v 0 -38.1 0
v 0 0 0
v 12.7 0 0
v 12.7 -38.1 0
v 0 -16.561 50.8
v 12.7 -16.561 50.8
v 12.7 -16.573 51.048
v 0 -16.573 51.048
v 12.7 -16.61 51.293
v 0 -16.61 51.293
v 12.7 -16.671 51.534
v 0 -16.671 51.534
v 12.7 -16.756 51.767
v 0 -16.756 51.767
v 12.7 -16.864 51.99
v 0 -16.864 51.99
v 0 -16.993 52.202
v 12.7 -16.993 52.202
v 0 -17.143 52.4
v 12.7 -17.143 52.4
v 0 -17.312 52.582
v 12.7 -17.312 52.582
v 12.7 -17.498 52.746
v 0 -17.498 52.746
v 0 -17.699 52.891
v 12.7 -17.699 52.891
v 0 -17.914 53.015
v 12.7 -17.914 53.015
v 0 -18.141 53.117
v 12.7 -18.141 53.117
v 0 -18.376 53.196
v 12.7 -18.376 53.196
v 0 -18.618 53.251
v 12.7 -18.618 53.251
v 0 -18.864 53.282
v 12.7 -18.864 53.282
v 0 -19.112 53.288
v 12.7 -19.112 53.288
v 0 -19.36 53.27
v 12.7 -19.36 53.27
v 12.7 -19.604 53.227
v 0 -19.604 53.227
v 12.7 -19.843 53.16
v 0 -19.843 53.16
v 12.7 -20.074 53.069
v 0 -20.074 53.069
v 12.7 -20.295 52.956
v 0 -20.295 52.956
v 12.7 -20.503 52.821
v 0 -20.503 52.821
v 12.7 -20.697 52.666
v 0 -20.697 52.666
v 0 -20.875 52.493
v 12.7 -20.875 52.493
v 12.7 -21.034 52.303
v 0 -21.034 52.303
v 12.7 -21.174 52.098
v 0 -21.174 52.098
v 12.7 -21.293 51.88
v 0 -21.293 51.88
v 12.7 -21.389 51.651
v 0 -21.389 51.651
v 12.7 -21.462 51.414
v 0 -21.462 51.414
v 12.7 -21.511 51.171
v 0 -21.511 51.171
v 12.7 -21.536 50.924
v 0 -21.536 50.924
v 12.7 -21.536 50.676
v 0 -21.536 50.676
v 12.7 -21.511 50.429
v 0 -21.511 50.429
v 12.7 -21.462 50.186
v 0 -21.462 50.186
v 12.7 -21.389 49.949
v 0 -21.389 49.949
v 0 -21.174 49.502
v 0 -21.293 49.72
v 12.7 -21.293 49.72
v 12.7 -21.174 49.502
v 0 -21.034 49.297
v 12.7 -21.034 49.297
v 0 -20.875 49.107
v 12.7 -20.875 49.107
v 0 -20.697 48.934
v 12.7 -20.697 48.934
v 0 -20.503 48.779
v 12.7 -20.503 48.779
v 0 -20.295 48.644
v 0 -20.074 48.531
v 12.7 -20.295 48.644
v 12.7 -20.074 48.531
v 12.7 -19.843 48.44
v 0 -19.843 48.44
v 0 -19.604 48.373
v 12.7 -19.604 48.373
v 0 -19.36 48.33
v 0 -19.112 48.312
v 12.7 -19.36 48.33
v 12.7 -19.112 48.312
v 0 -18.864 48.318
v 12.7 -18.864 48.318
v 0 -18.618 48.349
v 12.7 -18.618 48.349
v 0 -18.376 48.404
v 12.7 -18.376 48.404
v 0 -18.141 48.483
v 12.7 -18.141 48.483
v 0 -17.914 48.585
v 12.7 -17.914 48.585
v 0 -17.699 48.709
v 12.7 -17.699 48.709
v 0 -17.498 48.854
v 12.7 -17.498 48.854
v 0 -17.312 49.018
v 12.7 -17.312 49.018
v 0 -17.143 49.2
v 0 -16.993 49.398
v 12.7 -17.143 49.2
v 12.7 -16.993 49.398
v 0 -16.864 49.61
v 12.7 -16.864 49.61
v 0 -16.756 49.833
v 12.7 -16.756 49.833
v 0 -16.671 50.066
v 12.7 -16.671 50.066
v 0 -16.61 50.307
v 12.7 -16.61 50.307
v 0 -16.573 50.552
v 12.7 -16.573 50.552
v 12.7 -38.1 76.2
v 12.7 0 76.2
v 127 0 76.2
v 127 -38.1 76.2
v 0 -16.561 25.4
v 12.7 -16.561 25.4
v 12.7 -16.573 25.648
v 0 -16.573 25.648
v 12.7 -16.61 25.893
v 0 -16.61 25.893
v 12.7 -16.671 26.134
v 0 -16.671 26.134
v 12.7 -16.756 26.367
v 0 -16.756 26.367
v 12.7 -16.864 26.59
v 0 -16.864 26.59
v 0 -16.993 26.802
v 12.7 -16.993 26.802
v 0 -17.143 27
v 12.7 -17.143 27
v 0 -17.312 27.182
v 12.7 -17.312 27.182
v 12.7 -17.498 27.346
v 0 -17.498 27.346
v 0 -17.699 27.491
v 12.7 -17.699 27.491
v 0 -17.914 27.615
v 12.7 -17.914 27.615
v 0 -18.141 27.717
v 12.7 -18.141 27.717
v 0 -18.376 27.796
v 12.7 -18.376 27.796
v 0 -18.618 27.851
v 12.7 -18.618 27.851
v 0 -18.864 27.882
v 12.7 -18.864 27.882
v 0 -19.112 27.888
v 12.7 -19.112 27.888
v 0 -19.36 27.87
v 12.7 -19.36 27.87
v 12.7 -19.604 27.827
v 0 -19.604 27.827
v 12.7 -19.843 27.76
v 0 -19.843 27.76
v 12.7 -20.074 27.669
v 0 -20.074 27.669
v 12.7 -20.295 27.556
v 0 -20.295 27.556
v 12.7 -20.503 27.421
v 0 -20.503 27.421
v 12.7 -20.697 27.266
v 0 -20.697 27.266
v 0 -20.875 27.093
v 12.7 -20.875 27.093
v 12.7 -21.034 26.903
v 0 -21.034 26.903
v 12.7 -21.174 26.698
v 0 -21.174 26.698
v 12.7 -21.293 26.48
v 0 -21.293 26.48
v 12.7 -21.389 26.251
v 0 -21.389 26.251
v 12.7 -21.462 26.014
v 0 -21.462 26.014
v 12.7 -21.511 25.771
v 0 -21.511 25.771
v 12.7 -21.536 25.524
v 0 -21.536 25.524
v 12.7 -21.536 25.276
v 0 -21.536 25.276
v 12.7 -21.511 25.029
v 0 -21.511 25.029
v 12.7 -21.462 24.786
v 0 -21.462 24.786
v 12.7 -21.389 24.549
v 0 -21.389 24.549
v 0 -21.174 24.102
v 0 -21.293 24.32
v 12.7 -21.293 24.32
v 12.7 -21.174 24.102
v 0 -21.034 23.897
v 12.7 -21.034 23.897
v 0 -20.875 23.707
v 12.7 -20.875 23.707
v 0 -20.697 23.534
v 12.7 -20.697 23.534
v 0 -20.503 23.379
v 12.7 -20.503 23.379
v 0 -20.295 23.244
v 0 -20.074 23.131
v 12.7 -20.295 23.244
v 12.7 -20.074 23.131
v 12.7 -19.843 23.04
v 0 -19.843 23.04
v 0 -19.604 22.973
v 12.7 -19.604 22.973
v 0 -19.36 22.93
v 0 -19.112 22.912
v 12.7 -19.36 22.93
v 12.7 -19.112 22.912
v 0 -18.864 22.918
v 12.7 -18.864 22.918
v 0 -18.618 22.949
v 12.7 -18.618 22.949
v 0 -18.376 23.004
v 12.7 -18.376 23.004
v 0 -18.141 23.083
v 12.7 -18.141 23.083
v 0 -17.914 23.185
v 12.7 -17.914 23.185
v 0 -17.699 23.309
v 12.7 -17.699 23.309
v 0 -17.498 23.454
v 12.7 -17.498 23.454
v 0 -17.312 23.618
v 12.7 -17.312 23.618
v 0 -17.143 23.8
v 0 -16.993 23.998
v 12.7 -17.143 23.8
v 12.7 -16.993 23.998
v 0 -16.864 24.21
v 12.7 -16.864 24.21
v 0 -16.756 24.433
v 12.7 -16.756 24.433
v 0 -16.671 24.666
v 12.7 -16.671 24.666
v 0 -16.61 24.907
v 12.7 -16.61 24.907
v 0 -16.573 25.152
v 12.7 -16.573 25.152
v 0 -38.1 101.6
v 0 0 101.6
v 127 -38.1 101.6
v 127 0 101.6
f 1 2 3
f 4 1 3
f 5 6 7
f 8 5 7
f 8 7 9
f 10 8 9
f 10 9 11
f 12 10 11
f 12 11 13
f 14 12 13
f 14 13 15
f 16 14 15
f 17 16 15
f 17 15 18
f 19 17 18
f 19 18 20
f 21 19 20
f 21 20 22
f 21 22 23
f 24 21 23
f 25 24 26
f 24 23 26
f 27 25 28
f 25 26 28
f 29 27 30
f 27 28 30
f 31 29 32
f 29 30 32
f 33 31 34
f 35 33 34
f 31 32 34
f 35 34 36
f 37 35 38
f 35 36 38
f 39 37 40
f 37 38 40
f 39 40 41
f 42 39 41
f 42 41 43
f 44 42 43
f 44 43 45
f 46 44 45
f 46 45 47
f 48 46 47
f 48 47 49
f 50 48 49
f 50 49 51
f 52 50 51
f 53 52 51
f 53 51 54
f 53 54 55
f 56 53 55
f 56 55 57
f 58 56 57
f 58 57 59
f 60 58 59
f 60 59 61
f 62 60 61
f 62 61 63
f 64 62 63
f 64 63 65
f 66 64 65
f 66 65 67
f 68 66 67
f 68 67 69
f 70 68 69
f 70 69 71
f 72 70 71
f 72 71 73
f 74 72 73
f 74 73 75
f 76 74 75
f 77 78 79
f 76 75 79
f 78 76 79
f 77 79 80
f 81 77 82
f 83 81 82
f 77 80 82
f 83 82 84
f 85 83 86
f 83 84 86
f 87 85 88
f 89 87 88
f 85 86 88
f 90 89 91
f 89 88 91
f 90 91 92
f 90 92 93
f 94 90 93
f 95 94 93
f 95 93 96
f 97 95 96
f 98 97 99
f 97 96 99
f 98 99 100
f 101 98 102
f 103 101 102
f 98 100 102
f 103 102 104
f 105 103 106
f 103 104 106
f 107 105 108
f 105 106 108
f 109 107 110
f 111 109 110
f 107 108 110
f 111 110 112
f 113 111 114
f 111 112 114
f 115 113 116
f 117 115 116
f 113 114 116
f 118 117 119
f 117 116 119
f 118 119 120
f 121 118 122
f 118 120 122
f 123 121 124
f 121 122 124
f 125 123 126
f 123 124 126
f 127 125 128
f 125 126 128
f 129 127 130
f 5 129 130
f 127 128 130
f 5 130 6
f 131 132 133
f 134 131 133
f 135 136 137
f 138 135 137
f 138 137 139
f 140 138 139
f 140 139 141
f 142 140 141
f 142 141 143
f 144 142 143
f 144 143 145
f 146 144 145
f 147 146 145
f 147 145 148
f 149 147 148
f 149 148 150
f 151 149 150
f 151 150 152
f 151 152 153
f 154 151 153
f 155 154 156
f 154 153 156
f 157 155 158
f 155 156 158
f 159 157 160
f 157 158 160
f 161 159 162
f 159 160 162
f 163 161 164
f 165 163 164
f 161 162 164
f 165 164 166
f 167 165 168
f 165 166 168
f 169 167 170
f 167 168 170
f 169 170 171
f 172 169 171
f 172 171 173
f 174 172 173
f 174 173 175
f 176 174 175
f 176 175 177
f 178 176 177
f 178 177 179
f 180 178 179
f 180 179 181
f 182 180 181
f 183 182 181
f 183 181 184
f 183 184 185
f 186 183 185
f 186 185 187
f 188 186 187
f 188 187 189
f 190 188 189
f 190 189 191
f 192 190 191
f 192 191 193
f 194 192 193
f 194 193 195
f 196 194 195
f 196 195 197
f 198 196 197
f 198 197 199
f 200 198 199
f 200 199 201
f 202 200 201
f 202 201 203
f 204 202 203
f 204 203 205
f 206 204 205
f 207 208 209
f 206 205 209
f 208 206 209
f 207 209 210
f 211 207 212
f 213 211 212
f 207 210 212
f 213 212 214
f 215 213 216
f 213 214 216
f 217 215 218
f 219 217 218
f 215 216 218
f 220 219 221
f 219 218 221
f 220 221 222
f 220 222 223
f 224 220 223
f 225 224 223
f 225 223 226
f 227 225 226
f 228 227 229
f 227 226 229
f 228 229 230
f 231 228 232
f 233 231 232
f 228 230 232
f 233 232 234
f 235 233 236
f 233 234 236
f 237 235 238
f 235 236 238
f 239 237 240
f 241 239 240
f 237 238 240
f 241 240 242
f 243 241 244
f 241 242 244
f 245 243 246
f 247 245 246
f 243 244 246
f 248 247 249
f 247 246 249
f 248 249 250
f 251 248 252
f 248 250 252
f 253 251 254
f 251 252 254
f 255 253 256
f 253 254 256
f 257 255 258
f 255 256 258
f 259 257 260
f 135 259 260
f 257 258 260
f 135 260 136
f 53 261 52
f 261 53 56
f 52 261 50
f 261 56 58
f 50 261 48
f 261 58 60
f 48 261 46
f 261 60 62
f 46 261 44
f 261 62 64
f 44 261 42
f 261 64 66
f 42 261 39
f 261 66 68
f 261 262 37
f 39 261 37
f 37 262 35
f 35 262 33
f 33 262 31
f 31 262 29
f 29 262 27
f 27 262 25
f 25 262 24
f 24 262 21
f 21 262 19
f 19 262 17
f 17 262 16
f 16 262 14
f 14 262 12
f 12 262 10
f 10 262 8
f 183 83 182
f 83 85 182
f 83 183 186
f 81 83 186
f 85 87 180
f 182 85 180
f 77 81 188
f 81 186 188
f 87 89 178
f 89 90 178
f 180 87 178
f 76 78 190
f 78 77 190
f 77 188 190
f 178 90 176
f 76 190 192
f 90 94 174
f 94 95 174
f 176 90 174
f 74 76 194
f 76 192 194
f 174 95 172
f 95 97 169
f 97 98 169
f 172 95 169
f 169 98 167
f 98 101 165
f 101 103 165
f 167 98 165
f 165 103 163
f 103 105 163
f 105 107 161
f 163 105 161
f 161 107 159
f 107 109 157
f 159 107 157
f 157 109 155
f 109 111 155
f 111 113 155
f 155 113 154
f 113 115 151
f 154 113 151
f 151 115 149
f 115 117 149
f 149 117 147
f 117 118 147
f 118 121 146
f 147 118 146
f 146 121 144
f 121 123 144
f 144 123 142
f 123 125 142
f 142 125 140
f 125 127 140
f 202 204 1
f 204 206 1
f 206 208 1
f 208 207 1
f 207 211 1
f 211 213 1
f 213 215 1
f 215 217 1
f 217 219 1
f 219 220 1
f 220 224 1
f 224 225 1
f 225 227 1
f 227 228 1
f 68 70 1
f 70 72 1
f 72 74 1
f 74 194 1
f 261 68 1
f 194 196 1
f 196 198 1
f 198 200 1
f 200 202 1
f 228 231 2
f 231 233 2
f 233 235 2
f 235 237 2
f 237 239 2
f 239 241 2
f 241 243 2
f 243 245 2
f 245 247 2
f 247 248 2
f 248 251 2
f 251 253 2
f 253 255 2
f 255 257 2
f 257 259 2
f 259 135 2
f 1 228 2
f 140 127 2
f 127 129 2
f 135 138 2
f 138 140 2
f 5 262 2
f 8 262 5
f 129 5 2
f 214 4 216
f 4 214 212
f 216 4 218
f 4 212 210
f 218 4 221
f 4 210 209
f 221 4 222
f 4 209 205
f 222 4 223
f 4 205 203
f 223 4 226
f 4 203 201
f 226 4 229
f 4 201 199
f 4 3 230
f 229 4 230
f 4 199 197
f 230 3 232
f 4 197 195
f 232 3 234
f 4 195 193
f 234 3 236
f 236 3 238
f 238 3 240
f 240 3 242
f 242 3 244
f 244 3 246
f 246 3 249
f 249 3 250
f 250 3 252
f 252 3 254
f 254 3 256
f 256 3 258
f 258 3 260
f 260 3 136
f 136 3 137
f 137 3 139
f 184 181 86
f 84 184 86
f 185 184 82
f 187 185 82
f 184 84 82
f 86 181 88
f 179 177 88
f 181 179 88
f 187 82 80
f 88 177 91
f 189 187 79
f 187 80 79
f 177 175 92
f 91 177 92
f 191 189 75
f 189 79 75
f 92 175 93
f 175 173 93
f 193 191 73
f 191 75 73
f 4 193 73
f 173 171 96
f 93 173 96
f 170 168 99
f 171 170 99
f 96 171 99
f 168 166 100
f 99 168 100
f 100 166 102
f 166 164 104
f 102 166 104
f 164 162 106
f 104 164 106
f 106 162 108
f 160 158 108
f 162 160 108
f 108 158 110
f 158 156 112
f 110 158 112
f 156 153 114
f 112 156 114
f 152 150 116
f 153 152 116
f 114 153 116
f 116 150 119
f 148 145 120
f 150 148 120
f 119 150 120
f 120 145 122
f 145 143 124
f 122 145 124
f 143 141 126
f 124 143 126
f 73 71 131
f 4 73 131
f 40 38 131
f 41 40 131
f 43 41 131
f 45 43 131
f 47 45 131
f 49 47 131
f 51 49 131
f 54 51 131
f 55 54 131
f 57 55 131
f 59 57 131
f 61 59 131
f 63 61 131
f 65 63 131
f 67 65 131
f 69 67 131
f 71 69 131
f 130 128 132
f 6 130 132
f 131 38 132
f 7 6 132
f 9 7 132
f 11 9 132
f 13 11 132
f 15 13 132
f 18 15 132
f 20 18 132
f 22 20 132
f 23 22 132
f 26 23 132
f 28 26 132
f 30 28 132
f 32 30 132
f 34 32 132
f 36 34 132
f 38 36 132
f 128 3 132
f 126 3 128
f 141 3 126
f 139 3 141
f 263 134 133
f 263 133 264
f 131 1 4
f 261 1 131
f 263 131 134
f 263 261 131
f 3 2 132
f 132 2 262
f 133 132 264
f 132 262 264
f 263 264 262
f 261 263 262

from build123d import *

# Parameters (mm, degrees)
F1_DEPTH = 38.1
F2_R     = 2.4892
F3_DEPTH = 12.701


with BuildPart() as f1:
    # F0 (on Front) → F1 (new body)
    with BuildSketch(Plane.XZ):
        Polygon((0, 101.6), (0, 0), (12.7, 0), (12.7, 76.2), (127, 76.2), (127, 101.6), align=None)
    extrude(amount=F1_DEPTH)

    # F2 (on face) → F3 (cut, through all)
    with BuildSketch(Plane.YZ.offset(12.7)):
        with Locations((-19.05, 50.8)):
            Circle(F2_R)
        with Locations((-19.05, 25.4)):
            Circle(F2_R)
    extrude(amount=-F3_DEPTH, mode=Mode.SUBTRACT)


solid = f1.part
